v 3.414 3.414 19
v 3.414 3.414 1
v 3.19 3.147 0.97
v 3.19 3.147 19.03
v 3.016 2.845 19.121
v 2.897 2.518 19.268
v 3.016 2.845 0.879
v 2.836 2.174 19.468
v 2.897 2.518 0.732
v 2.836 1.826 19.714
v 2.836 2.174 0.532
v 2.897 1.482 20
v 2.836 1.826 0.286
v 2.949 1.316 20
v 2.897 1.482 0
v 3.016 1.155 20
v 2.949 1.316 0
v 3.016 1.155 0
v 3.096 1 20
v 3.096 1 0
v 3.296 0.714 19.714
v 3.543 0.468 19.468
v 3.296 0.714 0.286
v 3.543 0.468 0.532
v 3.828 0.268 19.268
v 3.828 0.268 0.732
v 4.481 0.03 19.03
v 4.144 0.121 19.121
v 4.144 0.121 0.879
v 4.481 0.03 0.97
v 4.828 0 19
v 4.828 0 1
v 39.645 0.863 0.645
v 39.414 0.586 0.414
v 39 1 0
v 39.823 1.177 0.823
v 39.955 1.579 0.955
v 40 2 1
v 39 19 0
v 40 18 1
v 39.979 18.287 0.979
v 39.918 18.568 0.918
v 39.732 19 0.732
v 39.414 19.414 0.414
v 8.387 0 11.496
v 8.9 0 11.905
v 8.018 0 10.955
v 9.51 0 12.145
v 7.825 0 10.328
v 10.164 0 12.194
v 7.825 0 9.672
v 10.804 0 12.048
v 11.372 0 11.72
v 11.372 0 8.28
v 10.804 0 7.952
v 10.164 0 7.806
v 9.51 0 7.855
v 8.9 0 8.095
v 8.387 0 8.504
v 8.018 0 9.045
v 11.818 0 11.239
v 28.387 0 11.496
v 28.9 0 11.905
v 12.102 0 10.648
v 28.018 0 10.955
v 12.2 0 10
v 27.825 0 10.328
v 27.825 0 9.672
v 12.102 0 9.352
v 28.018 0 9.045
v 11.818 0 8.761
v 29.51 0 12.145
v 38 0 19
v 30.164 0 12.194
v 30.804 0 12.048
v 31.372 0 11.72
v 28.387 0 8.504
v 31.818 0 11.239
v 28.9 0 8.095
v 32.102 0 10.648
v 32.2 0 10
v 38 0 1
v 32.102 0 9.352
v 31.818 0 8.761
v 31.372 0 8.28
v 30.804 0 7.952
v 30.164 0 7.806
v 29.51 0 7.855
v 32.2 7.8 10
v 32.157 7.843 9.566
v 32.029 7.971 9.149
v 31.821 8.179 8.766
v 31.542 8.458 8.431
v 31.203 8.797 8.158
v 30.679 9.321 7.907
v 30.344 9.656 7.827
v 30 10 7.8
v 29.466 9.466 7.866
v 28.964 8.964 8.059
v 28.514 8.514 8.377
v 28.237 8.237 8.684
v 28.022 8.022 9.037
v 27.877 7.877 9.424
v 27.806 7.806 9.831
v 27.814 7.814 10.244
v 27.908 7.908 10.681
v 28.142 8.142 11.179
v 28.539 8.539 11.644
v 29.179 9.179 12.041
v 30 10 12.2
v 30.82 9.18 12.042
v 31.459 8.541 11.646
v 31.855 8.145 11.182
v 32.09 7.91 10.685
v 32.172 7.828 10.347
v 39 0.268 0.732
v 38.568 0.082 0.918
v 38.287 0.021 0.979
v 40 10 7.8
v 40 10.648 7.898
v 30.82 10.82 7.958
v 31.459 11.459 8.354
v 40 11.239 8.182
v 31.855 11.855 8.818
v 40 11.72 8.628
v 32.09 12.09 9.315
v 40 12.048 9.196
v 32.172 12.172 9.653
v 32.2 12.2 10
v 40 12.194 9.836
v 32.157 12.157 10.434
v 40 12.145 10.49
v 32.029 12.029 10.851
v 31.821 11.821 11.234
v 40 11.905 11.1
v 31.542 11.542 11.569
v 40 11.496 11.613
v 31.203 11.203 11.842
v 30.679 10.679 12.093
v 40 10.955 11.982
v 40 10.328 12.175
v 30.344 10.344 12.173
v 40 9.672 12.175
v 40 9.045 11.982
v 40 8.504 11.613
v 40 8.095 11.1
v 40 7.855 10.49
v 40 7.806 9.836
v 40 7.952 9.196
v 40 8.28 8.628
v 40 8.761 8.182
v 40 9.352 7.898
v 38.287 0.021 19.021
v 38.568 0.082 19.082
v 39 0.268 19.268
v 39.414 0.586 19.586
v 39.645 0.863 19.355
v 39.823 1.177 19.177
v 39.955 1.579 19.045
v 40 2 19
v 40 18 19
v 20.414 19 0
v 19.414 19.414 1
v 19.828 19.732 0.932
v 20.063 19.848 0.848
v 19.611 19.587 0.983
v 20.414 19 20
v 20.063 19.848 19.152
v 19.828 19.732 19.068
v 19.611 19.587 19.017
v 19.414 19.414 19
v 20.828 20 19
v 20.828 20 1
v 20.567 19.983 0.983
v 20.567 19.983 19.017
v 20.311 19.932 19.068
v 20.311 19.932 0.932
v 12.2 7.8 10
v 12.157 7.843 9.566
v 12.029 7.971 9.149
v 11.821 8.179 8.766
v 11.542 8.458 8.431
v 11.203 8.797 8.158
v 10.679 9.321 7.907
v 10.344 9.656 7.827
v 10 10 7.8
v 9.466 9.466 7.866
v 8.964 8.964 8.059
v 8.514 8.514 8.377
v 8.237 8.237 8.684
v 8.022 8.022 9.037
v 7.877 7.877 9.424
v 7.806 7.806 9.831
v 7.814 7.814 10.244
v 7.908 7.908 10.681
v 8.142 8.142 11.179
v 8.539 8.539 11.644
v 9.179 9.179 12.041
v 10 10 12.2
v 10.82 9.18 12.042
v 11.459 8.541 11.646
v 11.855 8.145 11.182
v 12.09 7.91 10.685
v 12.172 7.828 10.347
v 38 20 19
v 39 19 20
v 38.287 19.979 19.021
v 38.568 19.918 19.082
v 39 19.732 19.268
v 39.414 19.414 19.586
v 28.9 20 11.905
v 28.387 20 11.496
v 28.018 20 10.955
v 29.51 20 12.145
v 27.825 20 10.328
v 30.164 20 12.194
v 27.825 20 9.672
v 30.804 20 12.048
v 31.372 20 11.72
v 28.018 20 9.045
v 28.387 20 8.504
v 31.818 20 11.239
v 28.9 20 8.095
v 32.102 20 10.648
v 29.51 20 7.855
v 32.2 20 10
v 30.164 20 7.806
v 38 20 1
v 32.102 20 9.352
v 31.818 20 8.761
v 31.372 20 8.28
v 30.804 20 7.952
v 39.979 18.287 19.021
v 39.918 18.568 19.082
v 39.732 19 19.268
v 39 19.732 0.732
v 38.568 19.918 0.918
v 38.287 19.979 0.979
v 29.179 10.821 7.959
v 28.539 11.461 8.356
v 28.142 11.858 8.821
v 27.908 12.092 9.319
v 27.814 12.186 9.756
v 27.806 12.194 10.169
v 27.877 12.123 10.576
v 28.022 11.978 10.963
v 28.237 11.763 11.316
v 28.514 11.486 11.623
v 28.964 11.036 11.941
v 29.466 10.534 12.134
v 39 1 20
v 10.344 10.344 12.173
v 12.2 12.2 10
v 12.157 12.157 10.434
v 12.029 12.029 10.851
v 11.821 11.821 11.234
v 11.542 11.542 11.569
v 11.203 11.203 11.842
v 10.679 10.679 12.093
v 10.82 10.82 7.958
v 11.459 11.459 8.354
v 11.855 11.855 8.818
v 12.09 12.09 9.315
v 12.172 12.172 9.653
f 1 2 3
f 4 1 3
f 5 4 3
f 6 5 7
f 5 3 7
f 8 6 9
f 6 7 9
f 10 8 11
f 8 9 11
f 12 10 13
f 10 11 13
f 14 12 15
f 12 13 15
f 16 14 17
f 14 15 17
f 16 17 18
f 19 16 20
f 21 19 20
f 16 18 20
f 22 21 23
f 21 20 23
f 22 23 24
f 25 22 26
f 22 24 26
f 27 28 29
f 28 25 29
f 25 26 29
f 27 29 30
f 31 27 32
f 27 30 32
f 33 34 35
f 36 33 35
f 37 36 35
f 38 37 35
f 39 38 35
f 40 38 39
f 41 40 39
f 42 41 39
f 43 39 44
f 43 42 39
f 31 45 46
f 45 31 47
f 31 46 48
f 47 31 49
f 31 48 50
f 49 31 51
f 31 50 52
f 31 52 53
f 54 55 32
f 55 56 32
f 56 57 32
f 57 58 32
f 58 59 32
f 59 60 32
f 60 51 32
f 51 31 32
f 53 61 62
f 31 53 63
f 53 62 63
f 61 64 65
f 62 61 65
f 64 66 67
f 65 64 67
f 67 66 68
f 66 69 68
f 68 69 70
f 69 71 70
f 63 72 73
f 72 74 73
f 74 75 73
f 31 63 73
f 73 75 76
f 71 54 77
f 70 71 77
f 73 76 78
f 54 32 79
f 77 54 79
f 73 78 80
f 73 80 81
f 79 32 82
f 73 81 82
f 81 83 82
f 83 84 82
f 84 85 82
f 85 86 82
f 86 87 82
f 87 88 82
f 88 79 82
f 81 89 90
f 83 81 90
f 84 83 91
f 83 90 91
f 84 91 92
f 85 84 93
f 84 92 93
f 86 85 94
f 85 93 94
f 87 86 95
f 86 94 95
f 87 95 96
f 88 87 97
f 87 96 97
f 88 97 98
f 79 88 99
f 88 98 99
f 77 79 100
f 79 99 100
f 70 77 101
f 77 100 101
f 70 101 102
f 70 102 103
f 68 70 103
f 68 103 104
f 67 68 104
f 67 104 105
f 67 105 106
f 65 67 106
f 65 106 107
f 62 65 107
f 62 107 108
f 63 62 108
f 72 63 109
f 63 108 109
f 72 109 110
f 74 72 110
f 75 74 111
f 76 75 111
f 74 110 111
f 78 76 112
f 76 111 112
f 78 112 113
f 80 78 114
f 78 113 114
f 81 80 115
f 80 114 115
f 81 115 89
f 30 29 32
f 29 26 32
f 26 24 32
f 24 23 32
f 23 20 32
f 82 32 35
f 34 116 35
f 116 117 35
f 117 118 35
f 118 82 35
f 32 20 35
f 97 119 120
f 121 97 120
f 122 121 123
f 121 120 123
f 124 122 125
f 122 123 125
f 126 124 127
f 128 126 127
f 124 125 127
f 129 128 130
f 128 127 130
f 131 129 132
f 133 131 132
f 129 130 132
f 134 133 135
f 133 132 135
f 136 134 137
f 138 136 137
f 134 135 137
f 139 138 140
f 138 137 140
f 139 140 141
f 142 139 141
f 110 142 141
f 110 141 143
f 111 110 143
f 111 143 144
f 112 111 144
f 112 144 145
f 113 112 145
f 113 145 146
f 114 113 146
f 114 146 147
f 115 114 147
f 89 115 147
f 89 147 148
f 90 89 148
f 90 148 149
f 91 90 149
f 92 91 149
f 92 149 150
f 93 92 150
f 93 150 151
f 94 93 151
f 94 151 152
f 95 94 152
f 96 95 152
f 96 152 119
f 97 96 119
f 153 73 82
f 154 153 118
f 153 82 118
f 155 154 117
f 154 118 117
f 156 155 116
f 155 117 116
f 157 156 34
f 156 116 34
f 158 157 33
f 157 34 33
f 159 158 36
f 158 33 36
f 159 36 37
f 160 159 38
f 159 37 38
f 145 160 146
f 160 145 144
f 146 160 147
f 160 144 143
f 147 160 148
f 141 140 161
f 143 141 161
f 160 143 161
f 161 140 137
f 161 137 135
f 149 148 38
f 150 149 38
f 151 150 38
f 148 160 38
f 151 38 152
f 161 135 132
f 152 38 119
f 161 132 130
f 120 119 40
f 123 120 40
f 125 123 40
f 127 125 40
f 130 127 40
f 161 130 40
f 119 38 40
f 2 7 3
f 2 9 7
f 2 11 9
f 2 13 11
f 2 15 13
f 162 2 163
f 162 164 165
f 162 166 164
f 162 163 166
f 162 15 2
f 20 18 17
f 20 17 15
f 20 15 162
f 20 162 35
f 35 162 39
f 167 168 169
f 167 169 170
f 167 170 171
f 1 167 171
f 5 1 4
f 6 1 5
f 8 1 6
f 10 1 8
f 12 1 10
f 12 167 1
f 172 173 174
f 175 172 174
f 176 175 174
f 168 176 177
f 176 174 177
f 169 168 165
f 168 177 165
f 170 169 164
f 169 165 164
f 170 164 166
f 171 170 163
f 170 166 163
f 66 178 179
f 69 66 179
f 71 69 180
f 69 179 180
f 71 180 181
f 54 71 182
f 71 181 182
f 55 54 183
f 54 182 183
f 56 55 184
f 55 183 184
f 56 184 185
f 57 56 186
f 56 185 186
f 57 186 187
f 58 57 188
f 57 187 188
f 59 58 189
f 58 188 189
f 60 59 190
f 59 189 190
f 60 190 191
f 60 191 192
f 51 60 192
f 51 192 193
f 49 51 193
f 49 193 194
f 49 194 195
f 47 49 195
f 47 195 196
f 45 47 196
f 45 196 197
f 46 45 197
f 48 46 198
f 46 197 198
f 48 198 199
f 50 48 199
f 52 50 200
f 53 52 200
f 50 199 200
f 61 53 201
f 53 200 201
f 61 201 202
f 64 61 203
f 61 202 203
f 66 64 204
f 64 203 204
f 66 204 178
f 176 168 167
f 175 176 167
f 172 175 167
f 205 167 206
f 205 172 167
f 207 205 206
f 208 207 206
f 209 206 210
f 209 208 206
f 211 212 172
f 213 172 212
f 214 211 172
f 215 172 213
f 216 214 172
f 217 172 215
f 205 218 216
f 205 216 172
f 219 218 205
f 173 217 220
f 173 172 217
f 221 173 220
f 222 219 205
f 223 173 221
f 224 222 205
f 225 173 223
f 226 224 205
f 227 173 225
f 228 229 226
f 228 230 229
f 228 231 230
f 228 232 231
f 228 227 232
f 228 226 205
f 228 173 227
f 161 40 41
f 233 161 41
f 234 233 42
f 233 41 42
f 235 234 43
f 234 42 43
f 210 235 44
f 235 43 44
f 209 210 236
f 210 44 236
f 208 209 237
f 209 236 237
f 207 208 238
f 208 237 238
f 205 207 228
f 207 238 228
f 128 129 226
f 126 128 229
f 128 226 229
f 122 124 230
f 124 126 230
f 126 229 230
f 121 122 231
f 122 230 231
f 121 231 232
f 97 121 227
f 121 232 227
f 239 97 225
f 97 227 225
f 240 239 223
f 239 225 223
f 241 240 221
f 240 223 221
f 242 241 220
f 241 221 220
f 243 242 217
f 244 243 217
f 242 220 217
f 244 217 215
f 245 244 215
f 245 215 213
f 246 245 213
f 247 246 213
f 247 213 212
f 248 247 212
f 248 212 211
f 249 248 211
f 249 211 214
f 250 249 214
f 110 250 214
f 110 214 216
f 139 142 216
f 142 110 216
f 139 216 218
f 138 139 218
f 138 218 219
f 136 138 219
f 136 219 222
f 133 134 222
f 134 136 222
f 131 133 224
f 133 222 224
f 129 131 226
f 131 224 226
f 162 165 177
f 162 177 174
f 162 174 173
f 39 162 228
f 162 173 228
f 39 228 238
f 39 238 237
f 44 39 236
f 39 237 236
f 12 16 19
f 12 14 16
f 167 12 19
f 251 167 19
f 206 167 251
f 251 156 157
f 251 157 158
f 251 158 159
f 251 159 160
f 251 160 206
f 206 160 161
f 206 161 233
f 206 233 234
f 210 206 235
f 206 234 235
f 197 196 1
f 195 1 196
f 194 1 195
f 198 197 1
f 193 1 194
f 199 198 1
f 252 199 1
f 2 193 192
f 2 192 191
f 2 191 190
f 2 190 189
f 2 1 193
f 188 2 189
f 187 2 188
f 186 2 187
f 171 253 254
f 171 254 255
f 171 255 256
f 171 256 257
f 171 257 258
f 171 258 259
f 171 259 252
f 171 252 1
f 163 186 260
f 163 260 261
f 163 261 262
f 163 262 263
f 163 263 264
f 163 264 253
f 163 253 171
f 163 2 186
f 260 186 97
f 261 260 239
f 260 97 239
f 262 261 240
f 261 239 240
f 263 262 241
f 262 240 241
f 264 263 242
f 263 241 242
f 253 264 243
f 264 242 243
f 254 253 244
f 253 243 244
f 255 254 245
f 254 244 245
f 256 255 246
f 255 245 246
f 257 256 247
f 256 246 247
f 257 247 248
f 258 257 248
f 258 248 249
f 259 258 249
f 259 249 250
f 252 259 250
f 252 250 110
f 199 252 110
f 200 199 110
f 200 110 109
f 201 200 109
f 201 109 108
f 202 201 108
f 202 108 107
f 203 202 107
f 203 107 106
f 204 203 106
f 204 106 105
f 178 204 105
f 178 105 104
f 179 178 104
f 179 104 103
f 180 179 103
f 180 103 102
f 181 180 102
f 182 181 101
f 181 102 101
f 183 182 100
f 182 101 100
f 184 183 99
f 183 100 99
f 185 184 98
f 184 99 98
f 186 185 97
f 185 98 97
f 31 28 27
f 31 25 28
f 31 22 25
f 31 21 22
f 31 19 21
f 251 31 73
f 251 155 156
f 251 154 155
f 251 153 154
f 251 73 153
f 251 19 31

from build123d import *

# Parameters (mm, degrees)
SKETCH1_W                  = 40
SKETCH1_H                  = 20
BOSS_EXTRUDE1_DEPTH        = 20
F_4_4_4_4_DIAMETER_HOLE1_D = 4.4
F_4_4_4_4_DIAMETER_HOLE2_D = 4.4
F_4_4_4_4_DIAMETER_HOLE3_D = 4.4
CUT_EXTRUDE2_DEPTH         = 49.989794856
CHAMFER3_SIZE              = 1
FILLET2_R                  = 2


with BuildPart() as part:
    # Sketch1 → Boss-Extrude1 (new body)
    with BuildSketch(Plane.XY):
        with Locations((20, 10)):
            Rectangle(SKETCH1_W, SKETCH1_H)
    extrude(amount=BOSS_EXTRUDE1_DEPTH)

    # Ø4.4 (4.4) Diameter Hole1 (through all)
    with Locations(Plane.ZY):
        with Locations((10, 10)):
            Hole(F_4_4_4_4_DIAMETER_HOLE1_D / 2)

    # Ø4.4 (4.4) Diameter Hole2 (through all)
    with Locations(Plane(origin=(0, 0, 0), x_dir=(-1, 0, 0), z_dir=(0, -1, 0))):
        with Locations((-30, -10)):
            Hole(F_4_4_4_4_DIAMETER_HOLE2_D / 2)

    # Ø4.4 (4.4) Diameter Hole3 (through all)
    with Locations(Plane(origin=(0, 0, 0), x_dir=(-1, 0, 0), z_dir=(0, -1, 0))):
        with Locations((-10, -10)):
            Hole(F_4_4_4_4_DIAMETER_HOLE3_D / 2)

    # Sketch9 → Cut-Extrude2 (cut, through all)
    with BuildSketch(Plane(origin=(0, 0, 0), x_dir=(-1, 0, 0), z_dir=(0, 0, -1))):
        Polygon((0, 0), (-20, 20), (0, 20), align=None)
    extrude(amount=-CUT_EXTRUDE2_DEPTH, mode=Mode.SUBTRACT)

    # Chamfer3
    chamfer3_edges = [part.edges().sort_by_distance(p)[0] for p in [
        (40, 10, 20),
        (30, 20, 20),
        (10, 10, 20),
        (10, 10, 0),
        (30, 20, 0),
        (40, 10, 0),
        (20, 0, 0),
        (20, 0, 20),
    ]]
    chamfer(chamfer3_edges, length=CHAMFER3_SIZE)

    # Fillet2
    # the kernel refuses this fillet: 2 mm, written as the material it takes off along each edge
    with BuildSketch(Plane(origin=(0, 0, -11.071067812), x_dir=(1, 0, 0), z_dir=(0, 0, 1))) as fillet2_piece_1:
        with BuildLine():
            CenterArc((FILLET2_R * 2.41421356237, FILLET2_R), FILLET2_R, 135, 135)
            Line((FILLET2_R * 1.70710678119, FILLET2_R * 1.70710678119), (0, 0))
            Line((0, 0), (FILLET2_R * 2.41421356237, 0))
        make_face()
    extrude(amount=42.142135624, mode=Mode.SUBTRACT)
    with BuildSketch(Plane(origin=(20, 20, -1.071067812), x_dir=(-0.7071067811865476, -0.7071067811865476, 0), z_dir=(0, 0, 1))) as fillet2_piece_2:
        with BuildLine():
            CenterArc((FILLET2_R * 0.414213562373, FILLET2_R), FILLET2_R, 225, 45)
            Line((-FILLET2_R * 0.292893218813, FILLET2_R * 0.292893218813), (0, 0))
            Line((0, 0), (FILLET2_R * 0.414213562373, 0))
        make_face()
    extrude(amount=22.142135624, mode=Mode.SUBTRACT)
    with BuildSketch(Plane(origin=(40, 20, -4), x_dir=(0, -1, 0), z_dir=(0, 0, 1)), Plane(origin=(40, 0, -4), x_dir=(-1, 0, 0), z_dir=(0, 0, 1))) as fillet2_piece_3:
        with BuildLine():
            CenterArc((FILLET2_R, -FILLET2_R), FILLET2_R, 90, 90)
            Line((0, -FILLET2_R), (0, 0))
            Line((0, 0), (FILLET2_R, 0))
        make_face()
    extrude(amount=28, mode=Mode.SUBTRACT)


solid = part.part
